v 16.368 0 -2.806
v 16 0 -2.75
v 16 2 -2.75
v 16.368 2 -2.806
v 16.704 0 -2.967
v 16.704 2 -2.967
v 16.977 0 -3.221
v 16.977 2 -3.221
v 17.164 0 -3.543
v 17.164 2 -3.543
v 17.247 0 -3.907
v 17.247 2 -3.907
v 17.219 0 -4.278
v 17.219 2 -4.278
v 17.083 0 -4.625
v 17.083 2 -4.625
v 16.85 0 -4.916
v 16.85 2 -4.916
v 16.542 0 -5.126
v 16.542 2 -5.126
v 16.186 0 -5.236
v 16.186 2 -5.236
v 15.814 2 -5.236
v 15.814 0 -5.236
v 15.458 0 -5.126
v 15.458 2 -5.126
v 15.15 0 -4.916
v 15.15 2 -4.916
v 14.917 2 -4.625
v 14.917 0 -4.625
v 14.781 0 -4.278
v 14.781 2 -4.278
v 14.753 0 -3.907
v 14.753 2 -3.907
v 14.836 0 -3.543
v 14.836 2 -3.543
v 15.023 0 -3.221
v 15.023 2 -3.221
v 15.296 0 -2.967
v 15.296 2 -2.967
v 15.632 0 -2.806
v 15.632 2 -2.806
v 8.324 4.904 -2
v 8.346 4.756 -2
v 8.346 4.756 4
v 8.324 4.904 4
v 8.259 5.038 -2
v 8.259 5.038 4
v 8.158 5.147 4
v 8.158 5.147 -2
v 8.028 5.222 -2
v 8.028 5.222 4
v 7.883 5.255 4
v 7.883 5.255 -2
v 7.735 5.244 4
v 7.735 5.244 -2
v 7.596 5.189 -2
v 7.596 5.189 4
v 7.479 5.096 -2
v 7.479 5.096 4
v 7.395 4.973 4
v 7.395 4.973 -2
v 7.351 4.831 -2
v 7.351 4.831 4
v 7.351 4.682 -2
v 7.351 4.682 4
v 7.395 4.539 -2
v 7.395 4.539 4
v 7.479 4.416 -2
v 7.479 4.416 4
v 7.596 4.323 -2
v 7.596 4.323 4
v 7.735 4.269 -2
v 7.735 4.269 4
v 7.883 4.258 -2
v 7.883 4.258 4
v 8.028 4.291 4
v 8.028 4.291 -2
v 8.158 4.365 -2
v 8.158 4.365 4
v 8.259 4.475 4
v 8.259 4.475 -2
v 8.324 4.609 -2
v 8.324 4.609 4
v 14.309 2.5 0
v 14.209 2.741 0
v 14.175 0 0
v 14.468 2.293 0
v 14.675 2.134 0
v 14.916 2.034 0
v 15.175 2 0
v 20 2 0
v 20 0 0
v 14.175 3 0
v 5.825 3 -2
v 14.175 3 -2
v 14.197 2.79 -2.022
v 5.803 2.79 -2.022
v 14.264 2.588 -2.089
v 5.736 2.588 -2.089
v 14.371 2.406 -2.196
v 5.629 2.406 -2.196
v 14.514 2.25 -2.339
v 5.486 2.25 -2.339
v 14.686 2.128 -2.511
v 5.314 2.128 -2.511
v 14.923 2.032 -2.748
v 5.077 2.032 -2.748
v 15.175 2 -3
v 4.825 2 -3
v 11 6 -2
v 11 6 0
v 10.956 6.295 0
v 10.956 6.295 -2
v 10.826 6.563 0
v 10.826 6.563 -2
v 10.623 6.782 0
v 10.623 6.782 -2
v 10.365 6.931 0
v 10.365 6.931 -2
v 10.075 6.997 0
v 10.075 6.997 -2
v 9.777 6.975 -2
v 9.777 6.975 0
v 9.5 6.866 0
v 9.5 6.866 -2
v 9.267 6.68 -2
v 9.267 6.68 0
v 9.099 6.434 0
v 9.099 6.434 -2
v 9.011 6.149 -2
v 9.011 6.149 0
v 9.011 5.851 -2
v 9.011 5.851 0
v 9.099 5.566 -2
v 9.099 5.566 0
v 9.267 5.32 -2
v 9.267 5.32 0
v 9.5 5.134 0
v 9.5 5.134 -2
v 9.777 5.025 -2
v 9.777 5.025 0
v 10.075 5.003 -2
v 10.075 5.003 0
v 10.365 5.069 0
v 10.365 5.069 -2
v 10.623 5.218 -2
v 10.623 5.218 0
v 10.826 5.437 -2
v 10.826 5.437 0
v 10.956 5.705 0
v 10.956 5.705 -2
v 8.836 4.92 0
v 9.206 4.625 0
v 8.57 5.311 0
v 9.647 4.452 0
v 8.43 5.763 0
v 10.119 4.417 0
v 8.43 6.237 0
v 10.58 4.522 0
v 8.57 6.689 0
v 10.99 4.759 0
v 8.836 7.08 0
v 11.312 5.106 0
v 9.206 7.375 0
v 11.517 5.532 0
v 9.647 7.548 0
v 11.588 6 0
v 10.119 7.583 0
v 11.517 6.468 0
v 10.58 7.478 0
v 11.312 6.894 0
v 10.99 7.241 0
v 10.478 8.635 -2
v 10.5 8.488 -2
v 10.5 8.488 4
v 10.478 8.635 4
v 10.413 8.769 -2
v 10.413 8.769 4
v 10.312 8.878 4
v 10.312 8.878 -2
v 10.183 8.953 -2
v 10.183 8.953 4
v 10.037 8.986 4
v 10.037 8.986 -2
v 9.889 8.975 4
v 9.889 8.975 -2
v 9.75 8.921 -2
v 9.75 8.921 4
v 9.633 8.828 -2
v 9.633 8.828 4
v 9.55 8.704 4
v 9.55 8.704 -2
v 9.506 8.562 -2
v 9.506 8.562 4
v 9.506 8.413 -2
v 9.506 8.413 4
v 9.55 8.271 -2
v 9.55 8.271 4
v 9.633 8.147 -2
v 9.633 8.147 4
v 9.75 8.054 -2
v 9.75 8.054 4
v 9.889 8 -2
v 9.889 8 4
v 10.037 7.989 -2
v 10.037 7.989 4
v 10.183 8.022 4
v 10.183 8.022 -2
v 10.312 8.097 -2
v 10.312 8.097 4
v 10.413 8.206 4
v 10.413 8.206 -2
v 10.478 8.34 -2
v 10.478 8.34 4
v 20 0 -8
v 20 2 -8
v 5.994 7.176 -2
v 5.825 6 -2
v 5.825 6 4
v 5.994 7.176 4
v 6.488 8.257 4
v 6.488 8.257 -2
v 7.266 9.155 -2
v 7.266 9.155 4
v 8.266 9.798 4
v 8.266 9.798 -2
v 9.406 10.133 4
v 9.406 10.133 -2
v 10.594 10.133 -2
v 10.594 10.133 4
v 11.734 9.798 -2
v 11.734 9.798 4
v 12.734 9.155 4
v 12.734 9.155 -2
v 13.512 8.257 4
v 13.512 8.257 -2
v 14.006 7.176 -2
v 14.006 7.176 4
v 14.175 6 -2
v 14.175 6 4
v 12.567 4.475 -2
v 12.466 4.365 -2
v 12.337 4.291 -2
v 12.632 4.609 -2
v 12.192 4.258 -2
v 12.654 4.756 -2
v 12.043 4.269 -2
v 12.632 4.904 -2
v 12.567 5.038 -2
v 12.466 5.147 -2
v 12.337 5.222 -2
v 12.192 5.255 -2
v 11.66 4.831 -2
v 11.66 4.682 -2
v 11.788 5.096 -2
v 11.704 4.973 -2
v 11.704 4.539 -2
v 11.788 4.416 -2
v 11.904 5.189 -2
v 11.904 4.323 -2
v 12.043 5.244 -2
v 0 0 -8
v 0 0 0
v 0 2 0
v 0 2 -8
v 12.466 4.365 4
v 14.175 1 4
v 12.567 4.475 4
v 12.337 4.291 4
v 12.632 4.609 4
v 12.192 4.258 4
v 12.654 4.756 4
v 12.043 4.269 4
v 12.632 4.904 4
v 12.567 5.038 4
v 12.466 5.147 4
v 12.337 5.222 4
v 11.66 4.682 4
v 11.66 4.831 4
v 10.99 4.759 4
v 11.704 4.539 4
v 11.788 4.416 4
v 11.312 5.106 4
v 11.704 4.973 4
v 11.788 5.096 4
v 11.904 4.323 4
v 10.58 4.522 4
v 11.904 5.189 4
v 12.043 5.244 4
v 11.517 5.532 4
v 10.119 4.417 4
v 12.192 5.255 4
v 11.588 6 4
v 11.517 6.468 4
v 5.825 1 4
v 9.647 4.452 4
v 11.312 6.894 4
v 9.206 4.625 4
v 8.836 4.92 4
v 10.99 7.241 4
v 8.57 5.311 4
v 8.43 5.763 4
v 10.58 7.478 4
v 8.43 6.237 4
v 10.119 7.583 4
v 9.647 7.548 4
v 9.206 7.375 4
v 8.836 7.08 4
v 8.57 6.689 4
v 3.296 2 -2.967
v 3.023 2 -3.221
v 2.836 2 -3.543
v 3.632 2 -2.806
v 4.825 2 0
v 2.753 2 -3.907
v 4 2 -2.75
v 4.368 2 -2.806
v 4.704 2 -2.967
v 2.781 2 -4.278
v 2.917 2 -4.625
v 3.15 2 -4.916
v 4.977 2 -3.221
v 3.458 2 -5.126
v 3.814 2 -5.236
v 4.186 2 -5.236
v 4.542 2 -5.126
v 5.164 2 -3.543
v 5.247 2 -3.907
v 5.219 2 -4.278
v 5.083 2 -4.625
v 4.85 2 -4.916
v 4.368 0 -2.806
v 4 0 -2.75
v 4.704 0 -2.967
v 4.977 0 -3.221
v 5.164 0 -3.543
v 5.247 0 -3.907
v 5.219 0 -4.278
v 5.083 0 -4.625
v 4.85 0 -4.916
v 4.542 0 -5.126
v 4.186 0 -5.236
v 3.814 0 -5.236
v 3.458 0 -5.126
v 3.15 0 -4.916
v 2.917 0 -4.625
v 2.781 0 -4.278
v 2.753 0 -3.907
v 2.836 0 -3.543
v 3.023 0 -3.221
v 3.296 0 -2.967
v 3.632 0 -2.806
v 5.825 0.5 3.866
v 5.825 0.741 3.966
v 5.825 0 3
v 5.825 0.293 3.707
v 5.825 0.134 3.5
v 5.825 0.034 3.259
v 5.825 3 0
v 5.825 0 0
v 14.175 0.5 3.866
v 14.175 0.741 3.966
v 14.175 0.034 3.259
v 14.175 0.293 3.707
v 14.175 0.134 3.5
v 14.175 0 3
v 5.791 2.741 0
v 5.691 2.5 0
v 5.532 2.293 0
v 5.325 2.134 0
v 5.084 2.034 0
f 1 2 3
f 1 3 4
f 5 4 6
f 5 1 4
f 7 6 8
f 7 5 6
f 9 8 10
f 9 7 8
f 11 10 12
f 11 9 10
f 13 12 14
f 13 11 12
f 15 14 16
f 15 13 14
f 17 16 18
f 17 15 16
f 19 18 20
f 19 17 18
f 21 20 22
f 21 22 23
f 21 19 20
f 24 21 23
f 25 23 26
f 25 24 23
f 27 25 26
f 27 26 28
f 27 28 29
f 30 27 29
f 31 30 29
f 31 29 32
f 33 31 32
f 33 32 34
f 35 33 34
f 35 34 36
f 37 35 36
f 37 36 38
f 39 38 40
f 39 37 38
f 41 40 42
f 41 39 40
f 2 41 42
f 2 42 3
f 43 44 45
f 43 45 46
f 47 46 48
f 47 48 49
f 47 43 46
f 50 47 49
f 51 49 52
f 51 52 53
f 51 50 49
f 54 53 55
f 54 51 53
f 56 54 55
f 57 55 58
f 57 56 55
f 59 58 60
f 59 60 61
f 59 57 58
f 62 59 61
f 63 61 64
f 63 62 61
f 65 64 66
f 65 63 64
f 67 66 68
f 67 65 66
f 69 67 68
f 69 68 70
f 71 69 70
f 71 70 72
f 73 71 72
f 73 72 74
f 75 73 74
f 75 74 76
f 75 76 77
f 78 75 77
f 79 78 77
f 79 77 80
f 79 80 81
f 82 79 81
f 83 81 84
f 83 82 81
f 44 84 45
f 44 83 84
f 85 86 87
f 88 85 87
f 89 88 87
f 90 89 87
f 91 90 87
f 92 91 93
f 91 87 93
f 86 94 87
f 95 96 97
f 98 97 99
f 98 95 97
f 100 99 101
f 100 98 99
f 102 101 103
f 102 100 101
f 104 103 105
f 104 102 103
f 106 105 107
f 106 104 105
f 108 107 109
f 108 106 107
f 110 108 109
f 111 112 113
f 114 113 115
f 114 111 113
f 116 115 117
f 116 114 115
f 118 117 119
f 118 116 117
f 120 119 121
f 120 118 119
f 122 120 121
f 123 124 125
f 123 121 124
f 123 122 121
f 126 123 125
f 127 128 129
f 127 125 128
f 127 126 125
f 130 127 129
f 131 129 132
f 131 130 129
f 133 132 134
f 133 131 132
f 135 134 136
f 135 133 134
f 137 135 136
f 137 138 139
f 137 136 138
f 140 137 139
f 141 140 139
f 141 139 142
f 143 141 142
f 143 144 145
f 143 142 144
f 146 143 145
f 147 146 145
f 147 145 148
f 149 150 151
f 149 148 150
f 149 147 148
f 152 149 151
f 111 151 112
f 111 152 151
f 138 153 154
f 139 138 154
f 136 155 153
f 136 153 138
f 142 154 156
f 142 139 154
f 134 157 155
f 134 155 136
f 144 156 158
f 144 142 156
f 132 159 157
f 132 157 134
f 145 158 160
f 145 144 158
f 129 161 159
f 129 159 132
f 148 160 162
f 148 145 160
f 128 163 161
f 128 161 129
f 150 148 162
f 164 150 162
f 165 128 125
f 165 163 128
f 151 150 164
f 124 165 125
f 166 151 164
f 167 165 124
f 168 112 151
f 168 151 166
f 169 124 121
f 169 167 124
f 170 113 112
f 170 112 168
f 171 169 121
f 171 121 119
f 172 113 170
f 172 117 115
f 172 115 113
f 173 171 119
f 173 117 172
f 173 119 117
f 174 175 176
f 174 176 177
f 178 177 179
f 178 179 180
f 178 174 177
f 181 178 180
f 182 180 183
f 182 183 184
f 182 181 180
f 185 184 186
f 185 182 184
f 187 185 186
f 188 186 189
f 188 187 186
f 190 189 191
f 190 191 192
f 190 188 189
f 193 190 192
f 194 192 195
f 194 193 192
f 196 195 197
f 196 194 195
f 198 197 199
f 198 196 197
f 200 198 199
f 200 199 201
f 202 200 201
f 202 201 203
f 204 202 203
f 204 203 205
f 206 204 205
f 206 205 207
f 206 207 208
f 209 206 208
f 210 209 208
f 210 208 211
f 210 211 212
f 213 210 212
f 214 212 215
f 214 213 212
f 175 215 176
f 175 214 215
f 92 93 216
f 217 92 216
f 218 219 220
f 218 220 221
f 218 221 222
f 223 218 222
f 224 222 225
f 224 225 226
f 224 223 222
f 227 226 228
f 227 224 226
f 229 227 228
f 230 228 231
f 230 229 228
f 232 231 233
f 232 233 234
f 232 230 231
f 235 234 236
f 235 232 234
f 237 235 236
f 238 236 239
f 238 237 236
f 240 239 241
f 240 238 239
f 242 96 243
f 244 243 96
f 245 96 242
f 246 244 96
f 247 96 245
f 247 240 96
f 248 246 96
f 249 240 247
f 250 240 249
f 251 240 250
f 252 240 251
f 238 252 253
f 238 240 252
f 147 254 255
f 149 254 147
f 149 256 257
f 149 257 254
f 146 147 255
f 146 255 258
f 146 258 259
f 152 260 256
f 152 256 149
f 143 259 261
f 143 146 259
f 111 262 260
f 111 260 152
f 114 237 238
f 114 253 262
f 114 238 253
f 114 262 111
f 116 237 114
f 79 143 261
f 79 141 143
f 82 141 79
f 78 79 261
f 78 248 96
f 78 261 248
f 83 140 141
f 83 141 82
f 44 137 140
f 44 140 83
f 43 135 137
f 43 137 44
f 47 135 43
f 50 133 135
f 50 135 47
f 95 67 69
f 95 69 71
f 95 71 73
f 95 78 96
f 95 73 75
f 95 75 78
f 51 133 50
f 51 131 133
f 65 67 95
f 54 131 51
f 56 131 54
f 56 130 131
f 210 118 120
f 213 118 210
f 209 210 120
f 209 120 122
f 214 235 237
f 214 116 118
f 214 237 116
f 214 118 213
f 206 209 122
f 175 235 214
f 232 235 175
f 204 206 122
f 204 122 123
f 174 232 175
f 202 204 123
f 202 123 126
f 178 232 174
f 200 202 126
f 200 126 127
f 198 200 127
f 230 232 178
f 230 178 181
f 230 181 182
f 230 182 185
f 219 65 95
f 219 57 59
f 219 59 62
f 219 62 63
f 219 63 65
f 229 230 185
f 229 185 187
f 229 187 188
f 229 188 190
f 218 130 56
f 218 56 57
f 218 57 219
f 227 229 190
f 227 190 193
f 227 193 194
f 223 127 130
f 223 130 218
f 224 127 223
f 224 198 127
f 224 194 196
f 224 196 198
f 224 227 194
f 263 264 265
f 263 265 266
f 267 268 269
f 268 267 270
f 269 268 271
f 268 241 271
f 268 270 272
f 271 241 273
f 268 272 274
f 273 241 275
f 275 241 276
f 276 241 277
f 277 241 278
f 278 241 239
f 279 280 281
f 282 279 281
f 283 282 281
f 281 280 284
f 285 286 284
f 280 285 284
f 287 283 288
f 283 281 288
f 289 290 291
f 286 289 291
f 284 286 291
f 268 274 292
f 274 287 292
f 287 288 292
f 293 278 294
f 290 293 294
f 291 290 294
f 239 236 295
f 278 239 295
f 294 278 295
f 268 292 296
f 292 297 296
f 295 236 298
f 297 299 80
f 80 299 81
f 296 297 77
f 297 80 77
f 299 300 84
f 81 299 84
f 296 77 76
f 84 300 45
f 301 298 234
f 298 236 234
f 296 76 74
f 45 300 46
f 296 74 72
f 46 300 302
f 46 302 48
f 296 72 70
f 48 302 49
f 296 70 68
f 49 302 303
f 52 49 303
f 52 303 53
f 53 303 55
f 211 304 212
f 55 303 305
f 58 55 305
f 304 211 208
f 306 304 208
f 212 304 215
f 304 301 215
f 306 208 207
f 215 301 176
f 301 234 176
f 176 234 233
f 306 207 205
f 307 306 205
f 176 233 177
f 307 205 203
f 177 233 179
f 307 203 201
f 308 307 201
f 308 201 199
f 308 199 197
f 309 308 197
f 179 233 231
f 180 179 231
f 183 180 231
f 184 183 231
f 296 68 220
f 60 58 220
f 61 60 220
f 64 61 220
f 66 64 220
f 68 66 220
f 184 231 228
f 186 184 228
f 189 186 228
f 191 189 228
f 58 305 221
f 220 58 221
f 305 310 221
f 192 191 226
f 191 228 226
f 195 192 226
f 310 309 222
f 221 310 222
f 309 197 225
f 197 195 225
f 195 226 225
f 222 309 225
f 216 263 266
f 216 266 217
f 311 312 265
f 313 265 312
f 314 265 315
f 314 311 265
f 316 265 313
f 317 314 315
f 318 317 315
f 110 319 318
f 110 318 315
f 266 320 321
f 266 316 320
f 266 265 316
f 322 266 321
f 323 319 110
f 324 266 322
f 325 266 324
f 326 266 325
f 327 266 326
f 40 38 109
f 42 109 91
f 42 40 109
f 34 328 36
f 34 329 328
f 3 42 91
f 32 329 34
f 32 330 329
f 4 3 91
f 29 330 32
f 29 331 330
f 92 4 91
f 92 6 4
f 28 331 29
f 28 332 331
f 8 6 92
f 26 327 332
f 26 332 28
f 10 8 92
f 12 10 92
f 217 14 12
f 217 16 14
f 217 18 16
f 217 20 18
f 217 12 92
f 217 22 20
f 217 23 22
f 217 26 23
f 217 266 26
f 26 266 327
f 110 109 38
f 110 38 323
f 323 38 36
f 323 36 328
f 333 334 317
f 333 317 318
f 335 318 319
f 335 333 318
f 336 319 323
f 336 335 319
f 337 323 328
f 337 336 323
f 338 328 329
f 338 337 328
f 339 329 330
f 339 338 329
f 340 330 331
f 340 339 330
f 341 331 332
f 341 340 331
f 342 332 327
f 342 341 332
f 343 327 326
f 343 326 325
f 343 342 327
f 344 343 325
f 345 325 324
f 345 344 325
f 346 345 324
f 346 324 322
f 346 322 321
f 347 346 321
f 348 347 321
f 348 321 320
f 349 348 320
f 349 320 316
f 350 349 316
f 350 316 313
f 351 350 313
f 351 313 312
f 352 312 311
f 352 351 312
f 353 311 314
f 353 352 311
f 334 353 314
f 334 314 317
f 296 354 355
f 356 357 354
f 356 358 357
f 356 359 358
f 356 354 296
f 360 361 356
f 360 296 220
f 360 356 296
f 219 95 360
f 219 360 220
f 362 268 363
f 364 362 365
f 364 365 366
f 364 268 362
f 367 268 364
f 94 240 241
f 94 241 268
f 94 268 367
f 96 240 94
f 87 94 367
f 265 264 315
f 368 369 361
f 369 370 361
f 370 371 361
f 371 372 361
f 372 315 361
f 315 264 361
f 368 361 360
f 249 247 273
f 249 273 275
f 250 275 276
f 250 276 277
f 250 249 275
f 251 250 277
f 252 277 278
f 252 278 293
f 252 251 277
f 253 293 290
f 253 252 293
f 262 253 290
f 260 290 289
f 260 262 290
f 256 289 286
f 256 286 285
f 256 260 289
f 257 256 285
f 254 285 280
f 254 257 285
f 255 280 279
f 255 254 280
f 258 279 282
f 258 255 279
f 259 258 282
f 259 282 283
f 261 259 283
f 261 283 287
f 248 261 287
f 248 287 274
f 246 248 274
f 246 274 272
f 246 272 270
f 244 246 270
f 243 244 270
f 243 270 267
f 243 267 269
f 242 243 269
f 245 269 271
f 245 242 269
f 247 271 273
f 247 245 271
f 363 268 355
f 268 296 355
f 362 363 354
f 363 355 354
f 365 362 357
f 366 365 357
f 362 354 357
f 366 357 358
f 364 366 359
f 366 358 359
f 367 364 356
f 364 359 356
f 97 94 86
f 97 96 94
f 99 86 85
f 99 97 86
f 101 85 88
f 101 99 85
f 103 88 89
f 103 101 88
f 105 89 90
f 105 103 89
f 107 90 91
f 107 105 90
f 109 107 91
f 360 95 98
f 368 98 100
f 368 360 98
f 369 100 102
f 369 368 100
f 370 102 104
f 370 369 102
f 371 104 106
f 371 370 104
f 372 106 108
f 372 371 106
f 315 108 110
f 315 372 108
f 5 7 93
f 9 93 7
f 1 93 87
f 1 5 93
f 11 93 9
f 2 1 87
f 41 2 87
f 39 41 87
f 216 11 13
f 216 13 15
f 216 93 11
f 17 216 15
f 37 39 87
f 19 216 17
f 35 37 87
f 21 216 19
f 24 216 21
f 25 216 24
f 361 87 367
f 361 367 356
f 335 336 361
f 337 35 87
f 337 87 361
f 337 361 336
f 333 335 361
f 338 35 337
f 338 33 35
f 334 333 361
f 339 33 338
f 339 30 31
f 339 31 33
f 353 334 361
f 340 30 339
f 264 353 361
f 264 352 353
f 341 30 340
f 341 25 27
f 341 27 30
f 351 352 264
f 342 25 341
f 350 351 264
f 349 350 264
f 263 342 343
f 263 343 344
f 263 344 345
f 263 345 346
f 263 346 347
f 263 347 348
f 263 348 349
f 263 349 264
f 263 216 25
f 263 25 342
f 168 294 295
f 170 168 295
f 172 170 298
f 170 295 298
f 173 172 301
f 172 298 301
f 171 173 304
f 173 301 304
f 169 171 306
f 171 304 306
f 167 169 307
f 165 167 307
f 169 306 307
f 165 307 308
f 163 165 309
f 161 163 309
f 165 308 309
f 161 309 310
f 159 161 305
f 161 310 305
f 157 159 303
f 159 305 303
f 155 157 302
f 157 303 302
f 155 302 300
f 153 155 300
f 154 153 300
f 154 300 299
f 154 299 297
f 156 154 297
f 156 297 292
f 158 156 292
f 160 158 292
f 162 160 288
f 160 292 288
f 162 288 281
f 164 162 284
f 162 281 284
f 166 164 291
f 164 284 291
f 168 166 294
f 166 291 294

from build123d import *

# Parameters (mm, degrees)
SKETCH1_W                = 20
SKETCH1_H                = 8
SKETCH1_R                = 1.25
BOSS_EXTRUDE1_DEPTH      = 2
BOSS_EXTRUDE2_DEPTH      = 4
BOSS_EXTRUDE2_DEPTH_BACK = 2
SKETCH3_R                = 0.5
SKETCH3_R_2              = 1
SKETCH5_R                = 1.5875
CUT_EXTRUDE1_DEPTH       = 4
FILLET1_R                = 1


with BuildPart() as part:
    # Sketch1 → Boss-Extrude1 (new body)
    with BuildSketch(Plane(origin=(0, 0, 0), x_dir=(1, 0, 0), z_dir=(0, 1, 0))):
        with Locations((10, 4)):
            Rectangle(SKETCH1_W, SKETCH1_H)
        with Locations(Location((4, 4, 0), (0, 0, 270))):
            Circle(SKETCH1_R, mode=Mode.SUBTRACT)
        with Locations(Location((16, 4, 0), (0, 0, 270))):
            Circle(SKETCH1_R, mode=Mode.SUBTRACT)
    extrude(amount=BOSS_EXTRUDE1_DEPTH)

    # Sketch3 → Boss-Extrude2 (add, two sides: drawn at the far end of the back side and taken through both)
    with BuildSketch(Plane.XY.offset(-BOSS_EXTRUDE2_DEPTH_BACK)):
        with BuildLine():
            Line((5.825, 2), (5.825, 6))
            ThreePointArc((5.825, 6), (10, 10.175), (14.175, 6))
            Line((14.175, 6), (14.175, 2))
            Line((14.175, 2), (14.175, 0))
            Line((14.175, 0), (5.825, 0))
            Line((5.825, 0), (5.825, 2))
        make_face()
        with Locations((10, 8.4875)):
            Circle(SKETCH3_R, mode=Mode.SUBTRACT)
        with Locations((12.154238192, 4.75625)):
            Circle(SKETCH3_R, mode=Mode.SUBTRACT)
        with Locations((7.845761808, 4.75625)):
            Circle(SKETCH3_R, mode=Mode.SUBTRACT)
        with Locations((10, 6)):
            Circle(SKETCH3_R_2, mode=Mode.SUBTRACT)
    extrude(amount=BOSS_EXTRUDE2_DEPTH + BOSS_EXTRUDE2_DEPTH_BACK)

    # Sketch5 → Cut-Extrude1 (cut)
    with BuildSketch(Plane.XY.offset(4)):
        with Locations((10, 6)):
            Circle(SKETCH5_R)
    extrude(amount=-CUT_EXTRUDE1_DEPTH, mode=Mode.SUBTRACT)

    # Fillet1
    fillet1_edges = [part.edges().sort_by_distance(p)[0] for p in [
        (10, 2, -2),
        (14.175, 2, -1),
        (5.825, 2, -1),
        (10, 0, 4),
    ]]
    fillet(fillet1_edges, radius=FILLET1_R)


solid = part.part
